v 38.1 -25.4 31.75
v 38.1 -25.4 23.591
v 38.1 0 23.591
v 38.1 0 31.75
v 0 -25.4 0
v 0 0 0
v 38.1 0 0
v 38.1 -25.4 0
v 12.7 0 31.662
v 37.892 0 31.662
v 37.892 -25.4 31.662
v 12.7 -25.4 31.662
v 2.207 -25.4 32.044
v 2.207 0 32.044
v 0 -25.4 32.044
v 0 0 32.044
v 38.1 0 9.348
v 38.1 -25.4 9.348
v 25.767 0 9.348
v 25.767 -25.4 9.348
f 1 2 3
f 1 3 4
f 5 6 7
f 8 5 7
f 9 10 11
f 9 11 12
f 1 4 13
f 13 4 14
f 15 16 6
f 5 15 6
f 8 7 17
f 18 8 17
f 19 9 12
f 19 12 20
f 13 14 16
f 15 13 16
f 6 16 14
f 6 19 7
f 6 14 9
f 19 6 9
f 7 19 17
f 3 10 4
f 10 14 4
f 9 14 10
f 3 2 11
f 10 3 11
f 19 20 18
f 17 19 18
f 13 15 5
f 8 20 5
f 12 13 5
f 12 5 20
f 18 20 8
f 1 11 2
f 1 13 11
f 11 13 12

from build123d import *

# Parameters (mm, degrees)
F1_DEPTH = 25.4
F3_DEPTH = 25.401


with BuildPart() as f1:
    # F0 (on Front) → F1 (new body)
    with BuildSketch(Plane.XZ):
        Polygon((2.206567, 32.044211), (0, 32.044211), (0, 0), (38.1, 0), (38.1, 31.75), align=None)
    extrude(amount=F1_DEPTH)

    # F2 (on Front) → F3 (cut, through all)
    with BuildSketch(Plane.XZ):
        Polygon((25.766958, 9.347903), (38.466958, 9.347903), (37.892044, 31.662248), (12.7, 31.662248), align=None)
    extrude(amount=F3_DEPTH, mode=Mode.SUBTRACT)


solid = f1.part
